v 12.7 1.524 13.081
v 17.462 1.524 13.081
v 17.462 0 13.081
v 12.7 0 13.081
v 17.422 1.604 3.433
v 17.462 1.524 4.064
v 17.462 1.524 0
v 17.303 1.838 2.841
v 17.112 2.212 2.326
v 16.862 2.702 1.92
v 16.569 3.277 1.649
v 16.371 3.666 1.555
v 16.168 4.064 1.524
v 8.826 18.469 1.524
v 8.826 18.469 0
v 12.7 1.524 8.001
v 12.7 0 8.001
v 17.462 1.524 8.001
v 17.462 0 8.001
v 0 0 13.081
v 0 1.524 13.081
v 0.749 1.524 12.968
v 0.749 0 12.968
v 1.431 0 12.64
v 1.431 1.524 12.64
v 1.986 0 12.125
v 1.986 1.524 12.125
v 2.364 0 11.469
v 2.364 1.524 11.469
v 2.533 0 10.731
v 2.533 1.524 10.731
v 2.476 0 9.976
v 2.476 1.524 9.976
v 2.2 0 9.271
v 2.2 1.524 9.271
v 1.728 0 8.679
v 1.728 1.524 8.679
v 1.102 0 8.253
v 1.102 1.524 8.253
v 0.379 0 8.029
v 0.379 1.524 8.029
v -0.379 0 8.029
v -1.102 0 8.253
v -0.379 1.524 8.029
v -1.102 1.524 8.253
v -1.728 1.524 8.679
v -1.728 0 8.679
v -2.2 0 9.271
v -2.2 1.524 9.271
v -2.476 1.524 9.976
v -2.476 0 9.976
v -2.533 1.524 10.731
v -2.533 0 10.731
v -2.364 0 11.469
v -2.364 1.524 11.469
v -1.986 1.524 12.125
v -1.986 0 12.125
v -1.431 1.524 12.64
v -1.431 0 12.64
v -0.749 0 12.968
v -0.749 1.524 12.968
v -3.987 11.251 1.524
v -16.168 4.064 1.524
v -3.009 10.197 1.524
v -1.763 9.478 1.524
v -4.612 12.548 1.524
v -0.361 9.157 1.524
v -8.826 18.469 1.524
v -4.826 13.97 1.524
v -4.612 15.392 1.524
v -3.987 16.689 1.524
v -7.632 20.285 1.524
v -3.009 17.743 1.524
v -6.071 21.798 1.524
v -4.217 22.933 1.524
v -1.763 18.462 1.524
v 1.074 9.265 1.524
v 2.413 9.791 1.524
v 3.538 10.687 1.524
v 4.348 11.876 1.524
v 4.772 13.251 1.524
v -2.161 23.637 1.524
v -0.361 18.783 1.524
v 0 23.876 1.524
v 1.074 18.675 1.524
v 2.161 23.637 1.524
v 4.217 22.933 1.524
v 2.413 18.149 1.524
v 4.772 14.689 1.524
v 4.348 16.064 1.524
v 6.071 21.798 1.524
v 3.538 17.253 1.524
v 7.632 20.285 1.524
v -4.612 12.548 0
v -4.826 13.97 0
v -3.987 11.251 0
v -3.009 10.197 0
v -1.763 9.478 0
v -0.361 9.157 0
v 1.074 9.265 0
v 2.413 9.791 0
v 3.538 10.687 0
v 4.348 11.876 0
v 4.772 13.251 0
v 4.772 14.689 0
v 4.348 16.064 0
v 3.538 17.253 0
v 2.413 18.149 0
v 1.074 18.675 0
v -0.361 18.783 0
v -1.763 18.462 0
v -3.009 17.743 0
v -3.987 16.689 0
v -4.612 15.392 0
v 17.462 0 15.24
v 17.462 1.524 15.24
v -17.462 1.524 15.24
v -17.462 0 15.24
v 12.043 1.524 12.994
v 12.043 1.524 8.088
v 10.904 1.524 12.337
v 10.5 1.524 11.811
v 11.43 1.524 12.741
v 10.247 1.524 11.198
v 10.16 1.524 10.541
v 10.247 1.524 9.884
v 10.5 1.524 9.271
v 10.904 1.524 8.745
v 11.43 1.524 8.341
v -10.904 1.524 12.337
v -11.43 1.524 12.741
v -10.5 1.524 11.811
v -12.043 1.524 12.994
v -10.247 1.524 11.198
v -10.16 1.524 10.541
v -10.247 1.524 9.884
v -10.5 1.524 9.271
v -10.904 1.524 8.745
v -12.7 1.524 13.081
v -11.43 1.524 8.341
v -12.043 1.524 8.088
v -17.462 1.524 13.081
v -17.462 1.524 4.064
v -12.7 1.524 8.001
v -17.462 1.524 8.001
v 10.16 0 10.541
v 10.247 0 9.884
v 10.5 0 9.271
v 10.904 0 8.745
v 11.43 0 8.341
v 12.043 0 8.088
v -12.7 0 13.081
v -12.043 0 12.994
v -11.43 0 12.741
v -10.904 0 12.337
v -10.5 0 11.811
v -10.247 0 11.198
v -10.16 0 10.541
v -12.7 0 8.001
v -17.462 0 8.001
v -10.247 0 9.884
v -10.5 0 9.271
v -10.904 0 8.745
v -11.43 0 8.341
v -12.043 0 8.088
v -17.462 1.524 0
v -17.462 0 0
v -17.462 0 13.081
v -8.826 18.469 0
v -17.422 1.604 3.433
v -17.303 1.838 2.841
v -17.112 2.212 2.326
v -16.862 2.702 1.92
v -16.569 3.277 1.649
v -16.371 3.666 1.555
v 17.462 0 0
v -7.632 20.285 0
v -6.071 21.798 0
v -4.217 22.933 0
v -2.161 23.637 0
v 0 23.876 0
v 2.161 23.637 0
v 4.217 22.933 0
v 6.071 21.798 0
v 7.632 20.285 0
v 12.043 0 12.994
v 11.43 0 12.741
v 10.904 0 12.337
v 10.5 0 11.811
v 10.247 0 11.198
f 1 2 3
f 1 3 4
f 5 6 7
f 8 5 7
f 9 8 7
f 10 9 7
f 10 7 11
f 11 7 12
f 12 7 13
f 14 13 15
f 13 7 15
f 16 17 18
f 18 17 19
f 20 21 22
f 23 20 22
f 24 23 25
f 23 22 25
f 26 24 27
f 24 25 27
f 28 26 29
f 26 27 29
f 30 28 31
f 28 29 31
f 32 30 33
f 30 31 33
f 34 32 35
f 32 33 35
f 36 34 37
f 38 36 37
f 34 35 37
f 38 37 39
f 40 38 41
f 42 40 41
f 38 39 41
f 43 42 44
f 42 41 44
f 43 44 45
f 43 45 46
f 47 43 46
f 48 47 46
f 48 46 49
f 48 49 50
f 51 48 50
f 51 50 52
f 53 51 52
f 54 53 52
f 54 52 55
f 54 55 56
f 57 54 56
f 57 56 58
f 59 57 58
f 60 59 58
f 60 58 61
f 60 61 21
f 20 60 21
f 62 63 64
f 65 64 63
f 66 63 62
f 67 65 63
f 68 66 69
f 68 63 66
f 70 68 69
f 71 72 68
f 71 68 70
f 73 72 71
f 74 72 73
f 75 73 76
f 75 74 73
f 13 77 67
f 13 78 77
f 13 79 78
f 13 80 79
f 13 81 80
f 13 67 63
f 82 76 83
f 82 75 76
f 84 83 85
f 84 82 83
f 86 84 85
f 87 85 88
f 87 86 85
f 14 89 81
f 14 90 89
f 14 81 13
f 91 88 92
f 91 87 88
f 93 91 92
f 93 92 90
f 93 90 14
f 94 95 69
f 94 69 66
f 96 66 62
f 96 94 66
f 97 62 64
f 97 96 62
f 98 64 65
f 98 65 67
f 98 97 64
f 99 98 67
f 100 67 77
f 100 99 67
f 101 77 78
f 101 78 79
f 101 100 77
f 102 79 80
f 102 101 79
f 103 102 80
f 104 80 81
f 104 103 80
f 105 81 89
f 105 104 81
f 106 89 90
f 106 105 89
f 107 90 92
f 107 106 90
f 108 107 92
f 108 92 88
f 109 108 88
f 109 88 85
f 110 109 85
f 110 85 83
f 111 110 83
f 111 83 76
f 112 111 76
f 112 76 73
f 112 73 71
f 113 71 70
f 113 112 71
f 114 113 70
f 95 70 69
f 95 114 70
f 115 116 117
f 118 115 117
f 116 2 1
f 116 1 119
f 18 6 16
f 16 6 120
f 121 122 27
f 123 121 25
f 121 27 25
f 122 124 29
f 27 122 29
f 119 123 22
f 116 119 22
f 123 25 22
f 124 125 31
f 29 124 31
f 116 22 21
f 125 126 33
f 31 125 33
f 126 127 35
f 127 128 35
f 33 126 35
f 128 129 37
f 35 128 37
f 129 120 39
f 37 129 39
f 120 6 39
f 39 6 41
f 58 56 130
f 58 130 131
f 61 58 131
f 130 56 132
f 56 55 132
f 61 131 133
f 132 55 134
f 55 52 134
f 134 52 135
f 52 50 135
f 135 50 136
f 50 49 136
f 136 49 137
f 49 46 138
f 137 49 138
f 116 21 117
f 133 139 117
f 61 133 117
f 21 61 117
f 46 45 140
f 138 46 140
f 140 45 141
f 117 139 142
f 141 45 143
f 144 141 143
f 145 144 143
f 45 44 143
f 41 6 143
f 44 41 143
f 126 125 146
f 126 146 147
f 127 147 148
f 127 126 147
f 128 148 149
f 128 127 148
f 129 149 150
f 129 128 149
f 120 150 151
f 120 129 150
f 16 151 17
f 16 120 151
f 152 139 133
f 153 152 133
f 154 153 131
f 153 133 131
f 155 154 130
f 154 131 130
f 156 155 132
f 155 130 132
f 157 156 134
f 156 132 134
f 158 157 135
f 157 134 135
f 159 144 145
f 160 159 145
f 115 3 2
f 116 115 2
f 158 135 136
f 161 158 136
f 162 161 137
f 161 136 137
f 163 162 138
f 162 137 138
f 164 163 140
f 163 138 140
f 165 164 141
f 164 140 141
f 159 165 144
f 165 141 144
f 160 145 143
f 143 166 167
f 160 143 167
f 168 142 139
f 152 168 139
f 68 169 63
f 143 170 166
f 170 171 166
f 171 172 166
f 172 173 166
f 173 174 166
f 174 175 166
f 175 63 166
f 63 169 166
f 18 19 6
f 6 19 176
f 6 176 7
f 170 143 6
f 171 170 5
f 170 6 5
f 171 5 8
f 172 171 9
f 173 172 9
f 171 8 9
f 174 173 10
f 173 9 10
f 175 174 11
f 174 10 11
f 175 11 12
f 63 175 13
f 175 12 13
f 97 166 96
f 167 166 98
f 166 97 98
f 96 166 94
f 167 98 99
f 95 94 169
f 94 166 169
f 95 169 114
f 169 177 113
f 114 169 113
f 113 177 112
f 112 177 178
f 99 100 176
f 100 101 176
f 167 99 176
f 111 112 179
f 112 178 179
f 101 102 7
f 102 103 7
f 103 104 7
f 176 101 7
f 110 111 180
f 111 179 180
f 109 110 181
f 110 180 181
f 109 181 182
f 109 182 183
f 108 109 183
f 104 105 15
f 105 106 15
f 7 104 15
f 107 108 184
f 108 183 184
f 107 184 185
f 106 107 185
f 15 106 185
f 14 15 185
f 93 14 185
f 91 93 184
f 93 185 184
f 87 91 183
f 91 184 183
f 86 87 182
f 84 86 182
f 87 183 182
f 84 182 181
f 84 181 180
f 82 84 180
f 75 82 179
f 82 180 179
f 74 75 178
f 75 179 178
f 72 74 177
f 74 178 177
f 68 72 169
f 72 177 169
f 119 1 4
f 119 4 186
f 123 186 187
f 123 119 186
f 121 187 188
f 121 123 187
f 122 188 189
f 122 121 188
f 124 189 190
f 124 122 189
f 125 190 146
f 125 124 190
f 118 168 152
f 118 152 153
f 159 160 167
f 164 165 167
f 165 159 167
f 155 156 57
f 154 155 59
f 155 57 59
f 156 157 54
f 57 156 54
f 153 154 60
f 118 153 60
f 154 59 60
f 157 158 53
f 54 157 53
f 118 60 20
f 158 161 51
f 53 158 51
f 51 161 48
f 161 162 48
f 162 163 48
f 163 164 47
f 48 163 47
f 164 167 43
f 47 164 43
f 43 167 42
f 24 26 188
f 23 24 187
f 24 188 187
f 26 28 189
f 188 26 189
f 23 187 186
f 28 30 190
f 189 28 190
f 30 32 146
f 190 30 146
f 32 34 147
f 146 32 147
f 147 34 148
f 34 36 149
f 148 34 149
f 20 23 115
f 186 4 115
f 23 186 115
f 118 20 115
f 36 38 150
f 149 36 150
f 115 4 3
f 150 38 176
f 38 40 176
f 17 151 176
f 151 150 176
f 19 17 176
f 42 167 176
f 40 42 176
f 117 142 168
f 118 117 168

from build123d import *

# Parameters (mm, degrees)
SKETCH1_R               = 4.826
EXTRUDE1_DEPTH          = 1.524
SKETCH2_W               = 34.925
SKETCH2_H               = 1.524
EXTRUDE2_DEPTH          = 15.24
SKETCH3_R               = 2.54
CUT_EXTRUDE1_DEPTH      = 33.199509472
CUT_EXTRUDE2_DEPTH      = 33.199509472
CUT_EXTRUDE2_DEPTH_BACK = 33.199509472
FILLET1_R               = 2.54


with BuildPart() as part:
    # Sketch1 → Extrude1 (new body)
    with BuildSketch(Plane.XY):
        with BuildLine():
            Line((-17.4625, 0), (17.4625, 0))
            Line((17.4625, 0), (17.4625, 1.524))
            Line((17.4625, 1.524), (8.825639974, 18.468545882))
            ThreePointArc((8.825639974, 18.468545882), (5.175241081, 22.416639317), (0, 23.876))
            ThreePointArc((0, 23.876), (-5.175241081, 22.416639317), (-8.825639974, 18.468545882))
            Line((-8.825639974, 18.468545882), (-17.4625, 1.524))
            Line((-17.4625, 1.524), (-17.4625, 0))
        make_face()
        with Locations(Location((0, 13.97, 0), (0, 0, 180))):
            Circle(SKETCH1_R, mode=Mode.SUBTRACT)
    extrude(amount=EXTRUDE1_DEPTH)

    # Sketch2 → Extrude2 (add)
    with BuildSketch(Plane(origin=(0, 0, 0), x_dir=(-1, 0, 0), z_dir=(0, 0, -1))):
        with Locations((0, 0.762)):
            Rectangle(SKETCH2_W, SKETCH2_H)
    extrude(amount=-EXTRUDE2_DEPTH)

    # Sketch3 → Cut-Extrude1 (cut, through all)
    with BuildSketch(Plane(origin=(0, 1.524, 0), x_dir=(-1, 0, 0), z_dir=(0, 1, 0))):
        with Locations(Location((0, 10.541, 0), (0, 0, 90))):
            Circle(SKETCH3_R)
    extrude(amount=-CUT_EXTRUDE1_DEPTH, mode=Mode.SUBTRACT)

    # Sketch4 → Cut-Extrude2 (cut, two sides)
    with BuildSketch(Plane(origin=(0, 1.524, 0), x_dir=(-1, 0, 0), z_dir=(0, 1, 0))) as cut_extrude2_sk:
        with BuildLine():
            Line((12.7, 8.001), (17.4625, 8.001))
            Line((17.4625, 8.001), (17.4625, 13.081))
            Line((17.4625, 13.081), (12.7, 13.081))
            ThreePointArc((12.7, 13.081), (10.903948776, 12.337051224), (10.16, 10.541))
            ThreePointArc((10.16, 10.541), (10.903948776, 8.744948776), (12.7, 8.001))
        make_face()
    cut_extrude2 = extrude(amount=CUT_EXTRUDE2_DEPTH, mode=Mode.SUBTRACT)
    cut_extrude2 = cut_extrude2 + extrude(cut_extrude2_sk.sketch, amount=-CUT_EXTRUDE2_DEPTH_BACK, mode=Mode.SUBTRACT)

    # Mirror1: Cut-Extrude2 across plane
    add(cut_extrude2.mirror(Plane(origin=(0, 0, 0), x_dir=(0, 0, 1), z_dir=(1, 0, 0))), mode=Mode.SUBTRACT)

    # Fillet1
    fillet1_edges = [part.edges().sort_by_distance(p)[0] for p in [
        (0, 1.524, 1.524),
    ]]
    fillet(fillet1_edges, radius=FILLET1_R)


solid = part.part
